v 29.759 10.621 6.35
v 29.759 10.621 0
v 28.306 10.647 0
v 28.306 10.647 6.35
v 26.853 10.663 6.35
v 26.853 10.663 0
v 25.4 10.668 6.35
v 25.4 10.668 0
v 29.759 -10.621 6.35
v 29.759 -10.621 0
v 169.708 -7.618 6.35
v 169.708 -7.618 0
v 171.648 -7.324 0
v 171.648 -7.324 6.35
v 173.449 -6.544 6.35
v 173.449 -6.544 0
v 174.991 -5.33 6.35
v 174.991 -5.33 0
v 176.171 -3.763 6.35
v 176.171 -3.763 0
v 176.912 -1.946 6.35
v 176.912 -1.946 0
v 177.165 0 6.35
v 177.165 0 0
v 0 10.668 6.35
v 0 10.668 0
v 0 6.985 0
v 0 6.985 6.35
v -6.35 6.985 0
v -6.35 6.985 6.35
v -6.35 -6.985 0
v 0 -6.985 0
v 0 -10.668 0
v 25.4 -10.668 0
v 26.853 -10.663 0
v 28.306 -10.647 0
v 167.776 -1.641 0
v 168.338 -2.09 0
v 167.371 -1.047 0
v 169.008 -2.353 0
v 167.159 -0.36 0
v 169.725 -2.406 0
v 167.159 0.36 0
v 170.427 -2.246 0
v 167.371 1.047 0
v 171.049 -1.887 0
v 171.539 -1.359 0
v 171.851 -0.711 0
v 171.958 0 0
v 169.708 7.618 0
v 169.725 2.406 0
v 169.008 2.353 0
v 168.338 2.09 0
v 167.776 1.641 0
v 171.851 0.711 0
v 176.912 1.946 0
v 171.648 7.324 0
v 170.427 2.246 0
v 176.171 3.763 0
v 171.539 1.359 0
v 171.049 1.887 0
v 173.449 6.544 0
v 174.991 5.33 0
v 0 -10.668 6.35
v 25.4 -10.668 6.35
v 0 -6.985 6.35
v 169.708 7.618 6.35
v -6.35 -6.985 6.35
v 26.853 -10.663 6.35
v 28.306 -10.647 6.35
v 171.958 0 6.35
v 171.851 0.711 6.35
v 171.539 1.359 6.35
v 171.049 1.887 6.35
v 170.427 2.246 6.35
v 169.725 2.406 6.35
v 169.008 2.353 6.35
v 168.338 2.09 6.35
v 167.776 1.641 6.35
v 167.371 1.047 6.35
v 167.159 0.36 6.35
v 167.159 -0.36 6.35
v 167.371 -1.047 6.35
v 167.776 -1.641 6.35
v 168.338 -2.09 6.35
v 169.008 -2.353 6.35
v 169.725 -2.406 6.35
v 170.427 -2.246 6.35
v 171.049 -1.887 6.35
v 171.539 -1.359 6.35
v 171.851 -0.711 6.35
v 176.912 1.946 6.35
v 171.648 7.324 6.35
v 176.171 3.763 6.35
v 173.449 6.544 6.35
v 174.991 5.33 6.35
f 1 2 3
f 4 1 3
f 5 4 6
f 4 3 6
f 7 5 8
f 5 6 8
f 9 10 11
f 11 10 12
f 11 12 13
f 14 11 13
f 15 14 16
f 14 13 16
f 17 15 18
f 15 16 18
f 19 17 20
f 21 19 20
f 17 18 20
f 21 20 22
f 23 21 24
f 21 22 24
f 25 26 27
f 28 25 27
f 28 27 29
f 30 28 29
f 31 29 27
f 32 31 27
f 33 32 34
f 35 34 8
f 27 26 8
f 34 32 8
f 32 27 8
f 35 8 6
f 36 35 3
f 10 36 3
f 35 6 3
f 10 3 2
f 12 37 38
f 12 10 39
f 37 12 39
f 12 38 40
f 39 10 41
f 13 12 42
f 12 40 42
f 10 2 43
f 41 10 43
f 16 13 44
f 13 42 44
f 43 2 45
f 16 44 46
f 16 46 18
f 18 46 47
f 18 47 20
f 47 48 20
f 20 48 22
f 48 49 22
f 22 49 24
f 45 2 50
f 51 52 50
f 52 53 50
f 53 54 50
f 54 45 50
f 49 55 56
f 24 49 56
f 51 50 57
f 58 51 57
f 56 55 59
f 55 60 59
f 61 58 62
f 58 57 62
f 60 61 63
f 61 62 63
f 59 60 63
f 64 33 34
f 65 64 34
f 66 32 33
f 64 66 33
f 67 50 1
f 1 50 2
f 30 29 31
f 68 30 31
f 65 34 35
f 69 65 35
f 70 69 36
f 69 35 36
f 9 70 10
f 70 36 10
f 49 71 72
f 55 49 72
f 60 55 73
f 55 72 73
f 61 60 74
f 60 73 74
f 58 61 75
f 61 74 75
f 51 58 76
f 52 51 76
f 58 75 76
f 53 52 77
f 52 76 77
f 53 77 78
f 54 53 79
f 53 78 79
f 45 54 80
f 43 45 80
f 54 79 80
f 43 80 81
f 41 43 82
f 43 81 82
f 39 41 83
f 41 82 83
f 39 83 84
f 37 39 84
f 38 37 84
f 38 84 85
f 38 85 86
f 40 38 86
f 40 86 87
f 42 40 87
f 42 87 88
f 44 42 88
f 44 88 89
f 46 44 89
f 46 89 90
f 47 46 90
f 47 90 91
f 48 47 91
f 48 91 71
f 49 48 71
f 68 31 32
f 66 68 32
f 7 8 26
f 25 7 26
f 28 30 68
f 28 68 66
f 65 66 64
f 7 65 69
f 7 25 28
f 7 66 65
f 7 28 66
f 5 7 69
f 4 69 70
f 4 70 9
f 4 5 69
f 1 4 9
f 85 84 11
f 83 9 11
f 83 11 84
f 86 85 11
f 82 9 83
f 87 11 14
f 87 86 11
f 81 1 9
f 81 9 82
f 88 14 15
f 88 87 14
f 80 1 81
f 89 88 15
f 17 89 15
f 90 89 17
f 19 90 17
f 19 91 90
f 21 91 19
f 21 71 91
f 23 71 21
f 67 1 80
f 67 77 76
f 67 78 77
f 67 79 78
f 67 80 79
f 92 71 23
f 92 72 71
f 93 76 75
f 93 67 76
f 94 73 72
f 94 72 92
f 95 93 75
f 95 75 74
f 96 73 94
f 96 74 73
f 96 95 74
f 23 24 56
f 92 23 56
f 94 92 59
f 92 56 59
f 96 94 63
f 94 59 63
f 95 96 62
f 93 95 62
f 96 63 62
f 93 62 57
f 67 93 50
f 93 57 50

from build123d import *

# Parameters (mm, degrees)
F1_DEPTH = 6.35
F2_R     = 2.413
F3_DEPTH = 6.351


with BuildPart() as f1:
    # F0 (on Top) → F1 (new body)
    with BuildSketch(Plane.XY):
        with BuildLine():
            Line((-6.35, 6.985), (-6.35, 0))
            Line((-6.35, 0), (-6.35, -6.985))
            Line((-6.35, -6.985), (0, -6.985))
            Line((0, -6.985), (0, -10.668))
            Line((0, -10.668), (25.4, -10.668))
            ThreePointArc((25.4, -10.668), (27.579726, -10.656309), (29.759202, -10.621236))
            Line((29.759202, -10.621236), (169.70847, -7.618246))
            ThreePointArc((169.70847, -7.618246), (174.990642, -5.330045), (177.165, 0))
            ThreePointArc((177.165, 0), (174.990642, 5.330045), (169.70847, 7.618246))
            Line((169.70847, 7.618246), (29.759202, 10.621236))
            ThreePointArc((29.759202, 10.621236), (27.579726, 10.656309), (25.4, 10.668))
            Line((25.4, 10.668), (0, 10.668))
            Line((0, 10.668), (0, 6.985))
            Line((0, 6.985), (-6.35, 6.985))
        make_face()
    extrude(amount=F1_DEPTH)

    # F2 (on face) → F3 (cut, through all)
    with BuildSketch(Plane.XY.offset(6.35)):
        with Locations((169.545, 0)):
            Circle(F2_R)
    extrude(amount=-F3_DEPTH, mode=Mode.SUBTRACT)


solid = f1.part
